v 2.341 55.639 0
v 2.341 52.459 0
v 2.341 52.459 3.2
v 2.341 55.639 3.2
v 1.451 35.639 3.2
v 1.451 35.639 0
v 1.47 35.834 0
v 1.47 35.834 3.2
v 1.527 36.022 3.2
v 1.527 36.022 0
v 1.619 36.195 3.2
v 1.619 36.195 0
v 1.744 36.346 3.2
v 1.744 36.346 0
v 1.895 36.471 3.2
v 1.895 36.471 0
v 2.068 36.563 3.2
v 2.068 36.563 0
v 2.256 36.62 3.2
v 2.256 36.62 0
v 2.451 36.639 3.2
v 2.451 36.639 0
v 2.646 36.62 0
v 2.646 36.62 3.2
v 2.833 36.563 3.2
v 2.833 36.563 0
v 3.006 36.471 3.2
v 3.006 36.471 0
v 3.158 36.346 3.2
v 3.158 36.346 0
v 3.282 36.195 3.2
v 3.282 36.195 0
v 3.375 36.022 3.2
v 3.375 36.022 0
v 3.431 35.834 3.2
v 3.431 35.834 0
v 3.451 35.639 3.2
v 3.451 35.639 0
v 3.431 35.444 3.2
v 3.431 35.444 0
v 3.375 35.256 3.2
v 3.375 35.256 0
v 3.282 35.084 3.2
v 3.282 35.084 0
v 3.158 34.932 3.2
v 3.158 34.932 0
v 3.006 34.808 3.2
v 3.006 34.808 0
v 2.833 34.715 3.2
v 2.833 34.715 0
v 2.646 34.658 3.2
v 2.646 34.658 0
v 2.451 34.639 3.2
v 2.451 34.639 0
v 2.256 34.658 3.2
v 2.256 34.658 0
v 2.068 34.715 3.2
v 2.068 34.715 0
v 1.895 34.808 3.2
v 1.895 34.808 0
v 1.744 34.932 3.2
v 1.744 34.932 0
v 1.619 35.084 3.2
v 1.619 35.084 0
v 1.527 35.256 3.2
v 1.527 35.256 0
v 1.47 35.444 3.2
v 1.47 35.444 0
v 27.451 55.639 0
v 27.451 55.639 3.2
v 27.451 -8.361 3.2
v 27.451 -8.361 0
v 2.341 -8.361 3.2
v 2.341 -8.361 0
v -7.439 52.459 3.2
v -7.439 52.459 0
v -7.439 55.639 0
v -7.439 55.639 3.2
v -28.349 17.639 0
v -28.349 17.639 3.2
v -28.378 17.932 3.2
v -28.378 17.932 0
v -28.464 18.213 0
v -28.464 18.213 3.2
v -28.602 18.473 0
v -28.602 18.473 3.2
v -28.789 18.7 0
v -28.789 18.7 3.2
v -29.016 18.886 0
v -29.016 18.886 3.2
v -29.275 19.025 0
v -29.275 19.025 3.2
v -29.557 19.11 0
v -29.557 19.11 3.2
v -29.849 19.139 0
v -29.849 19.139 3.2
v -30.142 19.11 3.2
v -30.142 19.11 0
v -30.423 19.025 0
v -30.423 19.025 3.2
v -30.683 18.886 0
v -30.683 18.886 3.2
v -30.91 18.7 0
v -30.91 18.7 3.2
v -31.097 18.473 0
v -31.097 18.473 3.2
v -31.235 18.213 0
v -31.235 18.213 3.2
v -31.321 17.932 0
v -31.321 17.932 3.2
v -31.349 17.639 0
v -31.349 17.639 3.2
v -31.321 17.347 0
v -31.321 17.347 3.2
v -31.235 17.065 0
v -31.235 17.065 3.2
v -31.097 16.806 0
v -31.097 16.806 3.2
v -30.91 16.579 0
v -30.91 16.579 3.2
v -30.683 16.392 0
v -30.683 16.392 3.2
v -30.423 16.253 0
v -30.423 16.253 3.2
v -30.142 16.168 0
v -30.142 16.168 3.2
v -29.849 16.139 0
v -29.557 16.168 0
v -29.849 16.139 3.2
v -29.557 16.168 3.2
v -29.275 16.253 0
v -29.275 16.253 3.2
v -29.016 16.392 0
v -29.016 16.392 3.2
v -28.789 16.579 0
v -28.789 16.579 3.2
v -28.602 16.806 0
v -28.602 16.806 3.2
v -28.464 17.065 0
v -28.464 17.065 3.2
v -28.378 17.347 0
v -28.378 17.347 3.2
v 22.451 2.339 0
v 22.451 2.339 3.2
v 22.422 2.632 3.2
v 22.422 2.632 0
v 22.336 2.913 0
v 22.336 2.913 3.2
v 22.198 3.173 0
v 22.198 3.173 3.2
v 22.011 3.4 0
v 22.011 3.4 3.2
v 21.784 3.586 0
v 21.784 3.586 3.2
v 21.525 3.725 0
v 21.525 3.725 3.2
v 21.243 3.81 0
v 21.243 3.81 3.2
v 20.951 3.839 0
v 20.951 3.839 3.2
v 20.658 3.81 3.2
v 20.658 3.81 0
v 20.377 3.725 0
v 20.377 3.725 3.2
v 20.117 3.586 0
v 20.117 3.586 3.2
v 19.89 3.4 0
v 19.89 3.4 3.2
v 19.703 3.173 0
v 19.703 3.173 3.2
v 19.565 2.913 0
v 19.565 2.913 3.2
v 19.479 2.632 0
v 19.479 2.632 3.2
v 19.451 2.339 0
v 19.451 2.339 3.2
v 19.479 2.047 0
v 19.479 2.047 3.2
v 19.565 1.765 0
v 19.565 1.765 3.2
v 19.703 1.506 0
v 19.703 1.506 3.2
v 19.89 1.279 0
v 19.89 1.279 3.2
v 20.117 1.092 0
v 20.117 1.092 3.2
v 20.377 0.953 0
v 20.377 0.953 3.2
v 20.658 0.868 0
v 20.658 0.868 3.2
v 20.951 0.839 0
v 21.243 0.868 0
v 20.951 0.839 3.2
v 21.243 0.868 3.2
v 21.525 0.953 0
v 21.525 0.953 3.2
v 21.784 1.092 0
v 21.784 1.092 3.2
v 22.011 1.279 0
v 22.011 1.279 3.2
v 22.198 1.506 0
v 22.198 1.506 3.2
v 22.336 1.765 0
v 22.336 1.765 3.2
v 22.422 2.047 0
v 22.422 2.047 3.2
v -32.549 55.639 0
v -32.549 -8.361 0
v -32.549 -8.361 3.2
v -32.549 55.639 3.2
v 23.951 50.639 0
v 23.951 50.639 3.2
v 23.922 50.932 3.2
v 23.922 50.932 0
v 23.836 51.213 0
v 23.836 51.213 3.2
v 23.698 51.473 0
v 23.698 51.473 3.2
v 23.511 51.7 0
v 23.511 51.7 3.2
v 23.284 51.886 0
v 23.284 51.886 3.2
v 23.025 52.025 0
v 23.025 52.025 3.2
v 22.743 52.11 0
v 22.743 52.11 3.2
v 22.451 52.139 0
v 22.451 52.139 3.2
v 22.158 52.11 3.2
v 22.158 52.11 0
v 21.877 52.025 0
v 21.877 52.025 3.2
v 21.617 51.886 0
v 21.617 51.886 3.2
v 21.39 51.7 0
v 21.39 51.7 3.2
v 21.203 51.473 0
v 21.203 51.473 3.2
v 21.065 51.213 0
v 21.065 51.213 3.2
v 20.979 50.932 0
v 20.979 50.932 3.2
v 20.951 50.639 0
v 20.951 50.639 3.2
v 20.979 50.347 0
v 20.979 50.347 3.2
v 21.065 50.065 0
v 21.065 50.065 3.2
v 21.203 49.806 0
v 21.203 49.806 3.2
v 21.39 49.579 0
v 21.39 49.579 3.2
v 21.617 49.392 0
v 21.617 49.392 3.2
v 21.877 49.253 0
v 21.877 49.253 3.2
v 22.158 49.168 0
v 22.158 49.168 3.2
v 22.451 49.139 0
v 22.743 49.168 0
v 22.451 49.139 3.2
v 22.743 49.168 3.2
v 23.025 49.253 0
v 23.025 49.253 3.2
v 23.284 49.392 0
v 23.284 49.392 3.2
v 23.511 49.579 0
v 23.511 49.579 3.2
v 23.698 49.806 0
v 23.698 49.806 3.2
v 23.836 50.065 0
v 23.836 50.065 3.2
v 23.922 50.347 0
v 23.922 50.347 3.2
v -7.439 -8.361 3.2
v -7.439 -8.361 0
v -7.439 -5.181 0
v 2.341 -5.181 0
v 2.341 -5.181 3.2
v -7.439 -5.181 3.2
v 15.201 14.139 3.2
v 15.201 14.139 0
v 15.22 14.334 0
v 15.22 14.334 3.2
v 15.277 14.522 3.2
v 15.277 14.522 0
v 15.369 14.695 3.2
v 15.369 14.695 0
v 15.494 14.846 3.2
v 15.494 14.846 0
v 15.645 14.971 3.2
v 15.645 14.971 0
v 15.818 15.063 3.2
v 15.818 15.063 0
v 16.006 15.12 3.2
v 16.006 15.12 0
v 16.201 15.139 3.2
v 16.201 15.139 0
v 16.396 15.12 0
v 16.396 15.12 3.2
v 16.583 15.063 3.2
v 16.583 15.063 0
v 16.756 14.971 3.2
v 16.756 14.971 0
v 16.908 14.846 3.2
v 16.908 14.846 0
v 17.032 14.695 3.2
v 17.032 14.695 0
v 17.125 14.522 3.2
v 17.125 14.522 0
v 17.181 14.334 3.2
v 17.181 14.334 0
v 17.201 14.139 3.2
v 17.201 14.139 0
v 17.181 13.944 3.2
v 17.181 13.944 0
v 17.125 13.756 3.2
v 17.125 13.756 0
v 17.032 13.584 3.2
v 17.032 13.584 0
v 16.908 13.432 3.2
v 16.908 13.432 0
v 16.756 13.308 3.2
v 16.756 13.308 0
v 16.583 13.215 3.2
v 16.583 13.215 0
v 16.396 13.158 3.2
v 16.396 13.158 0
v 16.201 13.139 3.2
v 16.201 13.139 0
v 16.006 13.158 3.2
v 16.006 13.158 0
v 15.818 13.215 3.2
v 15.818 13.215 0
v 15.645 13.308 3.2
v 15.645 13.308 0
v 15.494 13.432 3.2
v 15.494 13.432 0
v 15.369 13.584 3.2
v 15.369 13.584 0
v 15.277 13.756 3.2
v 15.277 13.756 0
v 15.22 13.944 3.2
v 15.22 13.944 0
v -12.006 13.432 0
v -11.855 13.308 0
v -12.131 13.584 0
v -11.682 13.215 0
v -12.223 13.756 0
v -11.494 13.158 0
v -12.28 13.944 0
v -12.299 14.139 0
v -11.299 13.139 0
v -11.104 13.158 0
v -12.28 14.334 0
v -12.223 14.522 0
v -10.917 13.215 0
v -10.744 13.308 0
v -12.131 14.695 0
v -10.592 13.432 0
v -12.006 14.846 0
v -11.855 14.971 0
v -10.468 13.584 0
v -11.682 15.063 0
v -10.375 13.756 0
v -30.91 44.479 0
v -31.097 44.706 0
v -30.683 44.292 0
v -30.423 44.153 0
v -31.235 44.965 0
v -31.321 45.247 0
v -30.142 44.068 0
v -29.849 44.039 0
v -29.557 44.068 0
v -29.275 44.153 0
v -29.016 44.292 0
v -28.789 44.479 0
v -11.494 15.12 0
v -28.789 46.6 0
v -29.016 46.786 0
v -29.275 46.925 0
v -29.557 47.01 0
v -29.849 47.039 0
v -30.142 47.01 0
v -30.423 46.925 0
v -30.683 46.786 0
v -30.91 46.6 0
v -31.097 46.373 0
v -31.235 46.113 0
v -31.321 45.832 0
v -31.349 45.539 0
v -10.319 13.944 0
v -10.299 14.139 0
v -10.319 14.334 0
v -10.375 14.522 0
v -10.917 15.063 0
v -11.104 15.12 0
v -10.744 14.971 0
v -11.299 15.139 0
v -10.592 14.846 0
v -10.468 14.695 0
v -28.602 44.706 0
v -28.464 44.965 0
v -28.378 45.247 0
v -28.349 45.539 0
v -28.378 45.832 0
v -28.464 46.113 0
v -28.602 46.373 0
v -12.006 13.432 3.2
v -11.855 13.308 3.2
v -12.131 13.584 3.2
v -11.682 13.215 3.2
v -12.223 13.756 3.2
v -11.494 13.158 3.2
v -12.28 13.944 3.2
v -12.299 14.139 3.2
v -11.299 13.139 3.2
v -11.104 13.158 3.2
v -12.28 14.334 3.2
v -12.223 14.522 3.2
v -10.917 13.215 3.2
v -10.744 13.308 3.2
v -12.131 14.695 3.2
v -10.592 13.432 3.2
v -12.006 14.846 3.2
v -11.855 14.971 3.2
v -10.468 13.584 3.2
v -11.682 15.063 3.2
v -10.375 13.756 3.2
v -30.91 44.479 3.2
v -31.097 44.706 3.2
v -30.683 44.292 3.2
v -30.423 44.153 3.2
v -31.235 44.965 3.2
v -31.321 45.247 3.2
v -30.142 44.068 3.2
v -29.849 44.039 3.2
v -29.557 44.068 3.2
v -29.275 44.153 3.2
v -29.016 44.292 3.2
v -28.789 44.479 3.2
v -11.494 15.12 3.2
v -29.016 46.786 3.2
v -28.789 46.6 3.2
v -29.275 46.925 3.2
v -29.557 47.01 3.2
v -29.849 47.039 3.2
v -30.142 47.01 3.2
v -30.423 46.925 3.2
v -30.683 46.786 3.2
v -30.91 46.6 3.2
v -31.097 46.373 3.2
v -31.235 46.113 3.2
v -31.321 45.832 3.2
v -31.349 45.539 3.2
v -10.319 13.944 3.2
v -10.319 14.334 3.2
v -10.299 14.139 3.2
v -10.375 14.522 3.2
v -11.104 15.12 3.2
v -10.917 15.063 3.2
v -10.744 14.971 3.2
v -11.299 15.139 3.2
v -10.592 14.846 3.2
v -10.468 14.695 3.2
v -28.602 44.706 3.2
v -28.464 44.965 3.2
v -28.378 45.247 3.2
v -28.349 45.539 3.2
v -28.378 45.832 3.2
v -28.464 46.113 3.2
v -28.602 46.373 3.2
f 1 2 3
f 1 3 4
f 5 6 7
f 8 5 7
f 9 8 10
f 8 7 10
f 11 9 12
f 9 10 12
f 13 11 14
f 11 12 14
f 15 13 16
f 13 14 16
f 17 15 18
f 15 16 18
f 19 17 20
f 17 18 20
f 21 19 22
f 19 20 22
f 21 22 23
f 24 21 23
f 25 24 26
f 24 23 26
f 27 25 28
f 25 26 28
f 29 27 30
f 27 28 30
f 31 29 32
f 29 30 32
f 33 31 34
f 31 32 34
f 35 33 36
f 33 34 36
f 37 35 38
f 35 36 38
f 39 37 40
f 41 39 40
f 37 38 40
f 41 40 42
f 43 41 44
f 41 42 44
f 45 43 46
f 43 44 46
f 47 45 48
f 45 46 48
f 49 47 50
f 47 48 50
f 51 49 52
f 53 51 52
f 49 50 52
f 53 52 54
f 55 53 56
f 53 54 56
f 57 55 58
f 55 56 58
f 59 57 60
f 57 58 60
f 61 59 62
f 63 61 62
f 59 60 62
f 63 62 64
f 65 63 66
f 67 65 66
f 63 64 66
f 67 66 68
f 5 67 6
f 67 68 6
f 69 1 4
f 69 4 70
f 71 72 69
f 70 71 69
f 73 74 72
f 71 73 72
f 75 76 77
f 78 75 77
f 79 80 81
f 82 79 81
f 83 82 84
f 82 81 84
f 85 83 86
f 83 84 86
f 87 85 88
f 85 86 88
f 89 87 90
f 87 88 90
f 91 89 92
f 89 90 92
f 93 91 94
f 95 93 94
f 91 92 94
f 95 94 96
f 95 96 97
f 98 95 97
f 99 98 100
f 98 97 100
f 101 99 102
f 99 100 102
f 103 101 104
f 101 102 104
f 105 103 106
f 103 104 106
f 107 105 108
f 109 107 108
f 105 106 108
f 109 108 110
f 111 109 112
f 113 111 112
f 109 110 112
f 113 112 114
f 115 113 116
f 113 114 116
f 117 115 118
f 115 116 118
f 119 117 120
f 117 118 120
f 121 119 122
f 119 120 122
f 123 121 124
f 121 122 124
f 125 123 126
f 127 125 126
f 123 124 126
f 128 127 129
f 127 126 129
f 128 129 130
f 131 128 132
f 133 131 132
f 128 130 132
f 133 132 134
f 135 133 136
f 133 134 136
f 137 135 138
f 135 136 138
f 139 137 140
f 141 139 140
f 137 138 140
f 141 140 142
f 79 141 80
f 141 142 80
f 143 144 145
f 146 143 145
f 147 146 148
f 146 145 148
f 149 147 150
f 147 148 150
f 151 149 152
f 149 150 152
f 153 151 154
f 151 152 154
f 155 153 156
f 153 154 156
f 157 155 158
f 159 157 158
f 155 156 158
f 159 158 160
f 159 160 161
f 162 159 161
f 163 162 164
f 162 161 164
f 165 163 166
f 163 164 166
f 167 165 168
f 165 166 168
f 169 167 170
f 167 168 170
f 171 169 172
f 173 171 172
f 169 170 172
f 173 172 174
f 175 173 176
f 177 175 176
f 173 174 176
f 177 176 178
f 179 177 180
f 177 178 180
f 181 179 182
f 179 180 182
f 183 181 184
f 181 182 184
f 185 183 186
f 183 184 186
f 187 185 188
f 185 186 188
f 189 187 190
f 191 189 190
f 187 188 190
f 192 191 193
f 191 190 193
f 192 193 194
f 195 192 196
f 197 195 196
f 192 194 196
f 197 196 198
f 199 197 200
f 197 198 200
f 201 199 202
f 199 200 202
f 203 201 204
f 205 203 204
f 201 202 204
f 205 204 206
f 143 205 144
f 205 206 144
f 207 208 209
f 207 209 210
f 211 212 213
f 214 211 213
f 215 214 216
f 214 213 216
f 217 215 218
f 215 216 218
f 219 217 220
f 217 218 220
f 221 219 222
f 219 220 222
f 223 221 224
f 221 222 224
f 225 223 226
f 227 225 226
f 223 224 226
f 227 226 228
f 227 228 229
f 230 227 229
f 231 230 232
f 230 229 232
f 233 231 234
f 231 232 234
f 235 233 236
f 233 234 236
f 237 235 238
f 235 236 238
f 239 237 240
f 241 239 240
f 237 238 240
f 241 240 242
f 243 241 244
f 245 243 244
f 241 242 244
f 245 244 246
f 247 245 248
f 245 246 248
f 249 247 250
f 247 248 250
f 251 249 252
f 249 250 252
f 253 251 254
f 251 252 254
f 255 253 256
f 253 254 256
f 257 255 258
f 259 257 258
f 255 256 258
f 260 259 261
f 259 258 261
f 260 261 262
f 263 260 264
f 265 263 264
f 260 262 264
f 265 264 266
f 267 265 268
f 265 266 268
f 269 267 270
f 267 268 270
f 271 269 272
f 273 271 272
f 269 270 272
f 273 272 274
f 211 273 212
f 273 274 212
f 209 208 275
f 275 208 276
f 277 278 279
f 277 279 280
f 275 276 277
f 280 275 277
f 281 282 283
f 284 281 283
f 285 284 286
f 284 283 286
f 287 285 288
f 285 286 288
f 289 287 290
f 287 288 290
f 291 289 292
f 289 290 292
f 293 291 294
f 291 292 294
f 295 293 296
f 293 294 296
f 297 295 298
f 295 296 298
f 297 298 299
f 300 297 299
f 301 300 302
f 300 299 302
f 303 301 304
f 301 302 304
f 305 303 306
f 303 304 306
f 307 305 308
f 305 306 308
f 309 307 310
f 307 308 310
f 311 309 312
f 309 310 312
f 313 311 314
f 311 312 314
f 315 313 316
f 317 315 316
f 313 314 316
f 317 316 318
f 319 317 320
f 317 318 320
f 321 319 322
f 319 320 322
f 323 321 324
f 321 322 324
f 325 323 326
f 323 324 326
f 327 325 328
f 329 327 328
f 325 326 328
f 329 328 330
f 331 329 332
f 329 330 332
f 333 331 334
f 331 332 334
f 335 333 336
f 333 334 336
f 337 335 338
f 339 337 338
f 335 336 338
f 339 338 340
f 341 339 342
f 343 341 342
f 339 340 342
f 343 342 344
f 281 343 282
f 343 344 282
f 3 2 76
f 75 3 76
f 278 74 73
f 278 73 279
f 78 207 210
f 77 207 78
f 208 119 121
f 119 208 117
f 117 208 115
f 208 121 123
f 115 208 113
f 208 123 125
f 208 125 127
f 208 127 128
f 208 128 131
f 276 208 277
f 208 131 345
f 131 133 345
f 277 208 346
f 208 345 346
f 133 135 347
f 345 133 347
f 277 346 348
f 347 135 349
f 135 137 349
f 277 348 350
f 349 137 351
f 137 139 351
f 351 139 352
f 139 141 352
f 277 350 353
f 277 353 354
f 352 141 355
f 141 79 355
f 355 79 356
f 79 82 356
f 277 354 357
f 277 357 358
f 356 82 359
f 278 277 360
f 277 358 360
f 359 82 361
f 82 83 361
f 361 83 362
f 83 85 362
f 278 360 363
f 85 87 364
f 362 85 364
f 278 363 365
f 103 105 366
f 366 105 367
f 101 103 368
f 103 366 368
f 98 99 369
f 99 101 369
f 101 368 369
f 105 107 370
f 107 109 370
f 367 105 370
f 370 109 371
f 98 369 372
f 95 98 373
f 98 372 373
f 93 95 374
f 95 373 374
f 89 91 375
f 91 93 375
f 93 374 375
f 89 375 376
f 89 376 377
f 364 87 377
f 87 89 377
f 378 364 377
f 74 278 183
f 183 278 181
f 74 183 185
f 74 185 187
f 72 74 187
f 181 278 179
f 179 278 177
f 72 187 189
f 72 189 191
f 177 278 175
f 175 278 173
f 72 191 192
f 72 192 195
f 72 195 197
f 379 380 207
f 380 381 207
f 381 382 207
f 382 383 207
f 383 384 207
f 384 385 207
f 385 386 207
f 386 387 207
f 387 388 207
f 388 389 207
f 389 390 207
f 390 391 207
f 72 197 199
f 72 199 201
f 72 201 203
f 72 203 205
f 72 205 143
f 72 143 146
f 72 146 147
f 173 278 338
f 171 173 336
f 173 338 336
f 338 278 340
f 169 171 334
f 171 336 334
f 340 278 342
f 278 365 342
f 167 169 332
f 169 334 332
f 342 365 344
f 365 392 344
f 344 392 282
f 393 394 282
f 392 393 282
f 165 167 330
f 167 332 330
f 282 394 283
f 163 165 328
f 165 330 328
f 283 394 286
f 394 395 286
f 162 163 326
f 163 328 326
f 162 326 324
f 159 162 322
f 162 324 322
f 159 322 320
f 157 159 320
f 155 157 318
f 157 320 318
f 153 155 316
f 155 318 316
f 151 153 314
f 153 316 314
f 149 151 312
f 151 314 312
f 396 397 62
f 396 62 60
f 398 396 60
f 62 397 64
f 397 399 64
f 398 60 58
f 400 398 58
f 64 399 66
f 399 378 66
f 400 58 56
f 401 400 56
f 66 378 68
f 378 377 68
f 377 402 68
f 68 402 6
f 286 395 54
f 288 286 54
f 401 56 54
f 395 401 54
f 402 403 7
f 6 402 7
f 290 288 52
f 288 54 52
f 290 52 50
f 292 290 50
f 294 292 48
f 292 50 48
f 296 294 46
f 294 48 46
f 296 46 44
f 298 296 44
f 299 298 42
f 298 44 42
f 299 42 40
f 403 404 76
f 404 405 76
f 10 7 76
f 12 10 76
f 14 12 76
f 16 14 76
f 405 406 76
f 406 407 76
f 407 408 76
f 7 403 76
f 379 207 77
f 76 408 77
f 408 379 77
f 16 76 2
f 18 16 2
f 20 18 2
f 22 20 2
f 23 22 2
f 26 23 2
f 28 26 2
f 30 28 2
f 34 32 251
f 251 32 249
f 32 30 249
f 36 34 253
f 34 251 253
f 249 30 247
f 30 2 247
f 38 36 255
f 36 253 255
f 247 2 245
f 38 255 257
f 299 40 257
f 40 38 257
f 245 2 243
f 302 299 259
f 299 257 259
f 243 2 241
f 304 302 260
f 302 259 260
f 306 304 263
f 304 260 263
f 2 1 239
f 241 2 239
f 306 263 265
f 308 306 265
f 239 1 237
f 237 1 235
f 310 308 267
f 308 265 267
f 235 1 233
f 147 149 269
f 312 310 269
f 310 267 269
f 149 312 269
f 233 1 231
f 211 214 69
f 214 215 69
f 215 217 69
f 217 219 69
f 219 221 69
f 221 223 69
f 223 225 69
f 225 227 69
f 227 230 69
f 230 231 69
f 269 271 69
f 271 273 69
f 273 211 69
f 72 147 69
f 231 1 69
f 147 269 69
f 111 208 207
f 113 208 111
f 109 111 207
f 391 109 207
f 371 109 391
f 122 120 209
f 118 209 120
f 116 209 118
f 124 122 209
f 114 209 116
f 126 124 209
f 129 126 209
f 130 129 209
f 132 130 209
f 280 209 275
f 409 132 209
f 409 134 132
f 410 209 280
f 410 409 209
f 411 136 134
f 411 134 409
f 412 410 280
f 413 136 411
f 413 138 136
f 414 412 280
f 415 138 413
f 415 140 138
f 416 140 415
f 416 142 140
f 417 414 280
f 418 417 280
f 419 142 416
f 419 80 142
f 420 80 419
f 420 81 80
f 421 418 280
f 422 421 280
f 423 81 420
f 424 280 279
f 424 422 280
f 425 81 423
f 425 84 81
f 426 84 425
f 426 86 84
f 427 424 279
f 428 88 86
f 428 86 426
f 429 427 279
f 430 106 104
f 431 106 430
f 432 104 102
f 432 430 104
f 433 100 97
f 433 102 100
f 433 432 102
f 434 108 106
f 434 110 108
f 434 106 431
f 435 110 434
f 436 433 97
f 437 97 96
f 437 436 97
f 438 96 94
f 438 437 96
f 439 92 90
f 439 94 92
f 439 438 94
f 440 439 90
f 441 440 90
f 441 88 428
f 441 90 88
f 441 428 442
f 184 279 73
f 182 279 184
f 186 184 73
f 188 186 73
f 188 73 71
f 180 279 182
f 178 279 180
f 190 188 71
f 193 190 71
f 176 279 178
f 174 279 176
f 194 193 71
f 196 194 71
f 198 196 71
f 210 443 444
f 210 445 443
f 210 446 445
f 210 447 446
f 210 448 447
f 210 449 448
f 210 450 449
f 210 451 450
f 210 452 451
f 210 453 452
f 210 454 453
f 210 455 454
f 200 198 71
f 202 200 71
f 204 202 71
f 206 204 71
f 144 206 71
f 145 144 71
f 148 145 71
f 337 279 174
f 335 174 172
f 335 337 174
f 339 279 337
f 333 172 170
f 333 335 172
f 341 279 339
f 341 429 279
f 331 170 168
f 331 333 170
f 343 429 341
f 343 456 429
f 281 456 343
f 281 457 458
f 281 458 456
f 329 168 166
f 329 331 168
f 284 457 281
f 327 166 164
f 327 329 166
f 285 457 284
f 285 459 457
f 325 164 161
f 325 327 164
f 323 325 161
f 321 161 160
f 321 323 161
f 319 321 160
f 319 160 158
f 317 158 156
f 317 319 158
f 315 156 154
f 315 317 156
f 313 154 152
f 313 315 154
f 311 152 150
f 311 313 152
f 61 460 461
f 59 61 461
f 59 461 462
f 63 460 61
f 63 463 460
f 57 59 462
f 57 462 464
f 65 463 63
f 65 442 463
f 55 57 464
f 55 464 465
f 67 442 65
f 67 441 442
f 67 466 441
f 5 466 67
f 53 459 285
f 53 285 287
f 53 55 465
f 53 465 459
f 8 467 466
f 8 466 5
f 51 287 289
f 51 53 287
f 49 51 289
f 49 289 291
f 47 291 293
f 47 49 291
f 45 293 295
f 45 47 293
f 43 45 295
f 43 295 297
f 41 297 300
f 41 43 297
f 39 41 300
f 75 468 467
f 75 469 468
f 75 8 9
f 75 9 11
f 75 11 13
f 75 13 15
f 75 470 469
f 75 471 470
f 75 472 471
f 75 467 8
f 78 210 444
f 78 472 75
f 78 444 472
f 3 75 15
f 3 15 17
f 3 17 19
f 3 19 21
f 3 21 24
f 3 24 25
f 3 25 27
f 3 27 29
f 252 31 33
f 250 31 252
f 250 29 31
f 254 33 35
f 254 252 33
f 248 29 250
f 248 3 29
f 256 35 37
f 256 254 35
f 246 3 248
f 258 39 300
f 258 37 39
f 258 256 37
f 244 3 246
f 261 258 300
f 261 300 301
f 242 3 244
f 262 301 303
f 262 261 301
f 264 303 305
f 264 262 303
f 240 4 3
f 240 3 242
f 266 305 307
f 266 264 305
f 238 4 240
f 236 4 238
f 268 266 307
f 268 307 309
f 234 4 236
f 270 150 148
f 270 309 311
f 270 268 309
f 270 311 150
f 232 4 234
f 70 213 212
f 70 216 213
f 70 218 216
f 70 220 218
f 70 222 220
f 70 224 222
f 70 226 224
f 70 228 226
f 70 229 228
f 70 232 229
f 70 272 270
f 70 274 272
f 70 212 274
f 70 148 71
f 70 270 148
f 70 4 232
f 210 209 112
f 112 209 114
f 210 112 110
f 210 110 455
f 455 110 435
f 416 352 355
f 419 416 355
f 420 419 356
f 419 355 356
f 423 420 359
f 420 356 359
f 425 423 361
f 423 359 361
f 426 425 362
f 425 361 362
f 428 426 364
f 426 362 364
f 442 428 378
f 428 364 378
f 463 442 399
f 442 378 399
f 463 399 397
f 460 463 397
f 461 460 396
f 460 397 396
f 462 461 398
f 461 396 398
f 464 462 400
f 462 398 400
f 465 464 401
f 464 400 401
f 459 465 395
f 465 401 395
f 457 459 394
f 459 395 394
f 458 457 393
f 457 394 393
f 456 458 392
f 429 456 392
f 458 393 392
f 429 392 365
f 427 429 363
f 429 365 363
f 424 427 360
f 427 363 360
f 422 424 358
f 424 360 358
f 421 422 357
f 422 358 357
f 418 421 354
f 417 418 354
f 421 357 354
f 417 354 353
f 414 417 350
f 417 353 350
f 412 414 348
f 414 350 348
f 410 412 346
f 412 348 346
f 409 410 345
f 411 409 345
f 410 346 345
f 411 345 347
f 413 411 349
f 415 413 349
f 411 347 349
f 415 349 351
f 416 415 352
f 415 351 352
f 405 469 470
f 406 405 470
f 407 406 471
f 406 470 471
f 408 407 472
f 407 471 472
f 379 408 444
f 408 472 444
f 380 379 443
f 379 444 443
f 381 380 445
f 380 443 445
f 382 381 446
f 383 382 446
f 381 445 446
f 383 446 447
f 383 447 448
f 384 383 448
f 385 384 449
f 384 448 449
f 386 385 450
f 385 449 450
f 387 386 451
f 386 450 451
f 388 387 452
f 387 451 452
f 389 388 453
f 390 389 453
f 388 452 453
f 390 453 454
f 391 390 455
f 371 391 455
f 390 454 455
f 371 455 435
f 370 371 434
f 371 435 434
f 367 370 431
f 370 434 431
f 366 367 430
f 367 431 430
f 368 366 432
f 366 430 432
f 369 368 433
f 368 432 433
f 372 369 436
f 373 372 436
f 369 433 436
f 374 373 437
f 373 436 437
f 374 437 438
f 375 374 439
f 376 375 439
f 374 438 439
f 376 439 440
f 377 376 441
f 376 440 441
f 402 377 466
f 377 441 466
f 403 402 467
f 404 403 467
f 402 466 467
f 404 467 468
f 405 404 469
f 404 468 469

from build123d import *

# Parameters (mm, degrees)
SKETCH2_W           = 60
SKETCH2_H           = 64
TOP_DEPTH           = 3.2
SKETCH3_R           = 1.5
ARDUINO_HOLES_DEPTH = 3.2
SKETCH5_R           = 1
BATTERY_CUT_DEPTH   = 3.2
SKETCH7_W           = 9.78
SKETCH7_H           = 3.18
FRICTION_FIT_DEPTH  = 10


with BuildPart() as part:
    # Sketch2 → Top (new body)
    with BuildSketch(Plane.XY):
        with Locations((-2.549375328, 23.639166253)):
            Rectangle(SKETCH2_W, SKETCH2_H)
    extrude(amount=TOP_DEPTH)

    # Sketch3 → Arduino Holes (cut)
    with BuildSketch(Plane.XY.offset(3.2)):
        with Locations((20.950624672, 2.339166253)):
            Circle(SKETCH3_R)
        with Locations((22.450624672, 50.639166253)):
            Circle(SKETCH3_R)
        with Locations((-29.849375328, 17.639166253)):
            Circle(SKETCH3_R)
        with Locations((-29.849375328, 45.539166253)):
            Circle(SKETCH3_R)
    extrude(amount=-ARDUINO_HOLES_DEPTH, mode=Mode.SUBTRACT)

    # Sketch5 → Battery Cut (cut)
    with BuildSketch(Plane(origin=(0, 0, 0), x_dir=(-1, 0, 0), z_dir=(0, 0, -1))):
        with Locations((-2.450624672, 35.639166253)):
            Circle(SKETCH5_R)
        with Locations((-16.200624672, 14.139166253)):
            Circle(SKETCH5_R)
        with Locations((11.299375328, 14.139166253)):
            Circle(SKETCH5_R)
    extrude(amount=-BATTERY_CUT_DEPTH, mode=Mode.SUBTRACT)

    # Sketch7 → Friction Fit (cut)
    with BuildSketch(Plane(origin=(0, 0, 0), x_dir=(-1, 0, 0), z_dir=(0, 0, -1))):
        with Locations((2.549375328, 54.049166253)):
            Rectangle(SKETCH7_W, SKETCH7_H)
        with Locations((2.549375328, -6.770833747)):
            Rectangle(SKETCH7_W, SKETCH7_H)
    extrude(amount=-FRICTION_FIT_DEPTH, mode=Mode.SUBTRACT)


solid = part.part
